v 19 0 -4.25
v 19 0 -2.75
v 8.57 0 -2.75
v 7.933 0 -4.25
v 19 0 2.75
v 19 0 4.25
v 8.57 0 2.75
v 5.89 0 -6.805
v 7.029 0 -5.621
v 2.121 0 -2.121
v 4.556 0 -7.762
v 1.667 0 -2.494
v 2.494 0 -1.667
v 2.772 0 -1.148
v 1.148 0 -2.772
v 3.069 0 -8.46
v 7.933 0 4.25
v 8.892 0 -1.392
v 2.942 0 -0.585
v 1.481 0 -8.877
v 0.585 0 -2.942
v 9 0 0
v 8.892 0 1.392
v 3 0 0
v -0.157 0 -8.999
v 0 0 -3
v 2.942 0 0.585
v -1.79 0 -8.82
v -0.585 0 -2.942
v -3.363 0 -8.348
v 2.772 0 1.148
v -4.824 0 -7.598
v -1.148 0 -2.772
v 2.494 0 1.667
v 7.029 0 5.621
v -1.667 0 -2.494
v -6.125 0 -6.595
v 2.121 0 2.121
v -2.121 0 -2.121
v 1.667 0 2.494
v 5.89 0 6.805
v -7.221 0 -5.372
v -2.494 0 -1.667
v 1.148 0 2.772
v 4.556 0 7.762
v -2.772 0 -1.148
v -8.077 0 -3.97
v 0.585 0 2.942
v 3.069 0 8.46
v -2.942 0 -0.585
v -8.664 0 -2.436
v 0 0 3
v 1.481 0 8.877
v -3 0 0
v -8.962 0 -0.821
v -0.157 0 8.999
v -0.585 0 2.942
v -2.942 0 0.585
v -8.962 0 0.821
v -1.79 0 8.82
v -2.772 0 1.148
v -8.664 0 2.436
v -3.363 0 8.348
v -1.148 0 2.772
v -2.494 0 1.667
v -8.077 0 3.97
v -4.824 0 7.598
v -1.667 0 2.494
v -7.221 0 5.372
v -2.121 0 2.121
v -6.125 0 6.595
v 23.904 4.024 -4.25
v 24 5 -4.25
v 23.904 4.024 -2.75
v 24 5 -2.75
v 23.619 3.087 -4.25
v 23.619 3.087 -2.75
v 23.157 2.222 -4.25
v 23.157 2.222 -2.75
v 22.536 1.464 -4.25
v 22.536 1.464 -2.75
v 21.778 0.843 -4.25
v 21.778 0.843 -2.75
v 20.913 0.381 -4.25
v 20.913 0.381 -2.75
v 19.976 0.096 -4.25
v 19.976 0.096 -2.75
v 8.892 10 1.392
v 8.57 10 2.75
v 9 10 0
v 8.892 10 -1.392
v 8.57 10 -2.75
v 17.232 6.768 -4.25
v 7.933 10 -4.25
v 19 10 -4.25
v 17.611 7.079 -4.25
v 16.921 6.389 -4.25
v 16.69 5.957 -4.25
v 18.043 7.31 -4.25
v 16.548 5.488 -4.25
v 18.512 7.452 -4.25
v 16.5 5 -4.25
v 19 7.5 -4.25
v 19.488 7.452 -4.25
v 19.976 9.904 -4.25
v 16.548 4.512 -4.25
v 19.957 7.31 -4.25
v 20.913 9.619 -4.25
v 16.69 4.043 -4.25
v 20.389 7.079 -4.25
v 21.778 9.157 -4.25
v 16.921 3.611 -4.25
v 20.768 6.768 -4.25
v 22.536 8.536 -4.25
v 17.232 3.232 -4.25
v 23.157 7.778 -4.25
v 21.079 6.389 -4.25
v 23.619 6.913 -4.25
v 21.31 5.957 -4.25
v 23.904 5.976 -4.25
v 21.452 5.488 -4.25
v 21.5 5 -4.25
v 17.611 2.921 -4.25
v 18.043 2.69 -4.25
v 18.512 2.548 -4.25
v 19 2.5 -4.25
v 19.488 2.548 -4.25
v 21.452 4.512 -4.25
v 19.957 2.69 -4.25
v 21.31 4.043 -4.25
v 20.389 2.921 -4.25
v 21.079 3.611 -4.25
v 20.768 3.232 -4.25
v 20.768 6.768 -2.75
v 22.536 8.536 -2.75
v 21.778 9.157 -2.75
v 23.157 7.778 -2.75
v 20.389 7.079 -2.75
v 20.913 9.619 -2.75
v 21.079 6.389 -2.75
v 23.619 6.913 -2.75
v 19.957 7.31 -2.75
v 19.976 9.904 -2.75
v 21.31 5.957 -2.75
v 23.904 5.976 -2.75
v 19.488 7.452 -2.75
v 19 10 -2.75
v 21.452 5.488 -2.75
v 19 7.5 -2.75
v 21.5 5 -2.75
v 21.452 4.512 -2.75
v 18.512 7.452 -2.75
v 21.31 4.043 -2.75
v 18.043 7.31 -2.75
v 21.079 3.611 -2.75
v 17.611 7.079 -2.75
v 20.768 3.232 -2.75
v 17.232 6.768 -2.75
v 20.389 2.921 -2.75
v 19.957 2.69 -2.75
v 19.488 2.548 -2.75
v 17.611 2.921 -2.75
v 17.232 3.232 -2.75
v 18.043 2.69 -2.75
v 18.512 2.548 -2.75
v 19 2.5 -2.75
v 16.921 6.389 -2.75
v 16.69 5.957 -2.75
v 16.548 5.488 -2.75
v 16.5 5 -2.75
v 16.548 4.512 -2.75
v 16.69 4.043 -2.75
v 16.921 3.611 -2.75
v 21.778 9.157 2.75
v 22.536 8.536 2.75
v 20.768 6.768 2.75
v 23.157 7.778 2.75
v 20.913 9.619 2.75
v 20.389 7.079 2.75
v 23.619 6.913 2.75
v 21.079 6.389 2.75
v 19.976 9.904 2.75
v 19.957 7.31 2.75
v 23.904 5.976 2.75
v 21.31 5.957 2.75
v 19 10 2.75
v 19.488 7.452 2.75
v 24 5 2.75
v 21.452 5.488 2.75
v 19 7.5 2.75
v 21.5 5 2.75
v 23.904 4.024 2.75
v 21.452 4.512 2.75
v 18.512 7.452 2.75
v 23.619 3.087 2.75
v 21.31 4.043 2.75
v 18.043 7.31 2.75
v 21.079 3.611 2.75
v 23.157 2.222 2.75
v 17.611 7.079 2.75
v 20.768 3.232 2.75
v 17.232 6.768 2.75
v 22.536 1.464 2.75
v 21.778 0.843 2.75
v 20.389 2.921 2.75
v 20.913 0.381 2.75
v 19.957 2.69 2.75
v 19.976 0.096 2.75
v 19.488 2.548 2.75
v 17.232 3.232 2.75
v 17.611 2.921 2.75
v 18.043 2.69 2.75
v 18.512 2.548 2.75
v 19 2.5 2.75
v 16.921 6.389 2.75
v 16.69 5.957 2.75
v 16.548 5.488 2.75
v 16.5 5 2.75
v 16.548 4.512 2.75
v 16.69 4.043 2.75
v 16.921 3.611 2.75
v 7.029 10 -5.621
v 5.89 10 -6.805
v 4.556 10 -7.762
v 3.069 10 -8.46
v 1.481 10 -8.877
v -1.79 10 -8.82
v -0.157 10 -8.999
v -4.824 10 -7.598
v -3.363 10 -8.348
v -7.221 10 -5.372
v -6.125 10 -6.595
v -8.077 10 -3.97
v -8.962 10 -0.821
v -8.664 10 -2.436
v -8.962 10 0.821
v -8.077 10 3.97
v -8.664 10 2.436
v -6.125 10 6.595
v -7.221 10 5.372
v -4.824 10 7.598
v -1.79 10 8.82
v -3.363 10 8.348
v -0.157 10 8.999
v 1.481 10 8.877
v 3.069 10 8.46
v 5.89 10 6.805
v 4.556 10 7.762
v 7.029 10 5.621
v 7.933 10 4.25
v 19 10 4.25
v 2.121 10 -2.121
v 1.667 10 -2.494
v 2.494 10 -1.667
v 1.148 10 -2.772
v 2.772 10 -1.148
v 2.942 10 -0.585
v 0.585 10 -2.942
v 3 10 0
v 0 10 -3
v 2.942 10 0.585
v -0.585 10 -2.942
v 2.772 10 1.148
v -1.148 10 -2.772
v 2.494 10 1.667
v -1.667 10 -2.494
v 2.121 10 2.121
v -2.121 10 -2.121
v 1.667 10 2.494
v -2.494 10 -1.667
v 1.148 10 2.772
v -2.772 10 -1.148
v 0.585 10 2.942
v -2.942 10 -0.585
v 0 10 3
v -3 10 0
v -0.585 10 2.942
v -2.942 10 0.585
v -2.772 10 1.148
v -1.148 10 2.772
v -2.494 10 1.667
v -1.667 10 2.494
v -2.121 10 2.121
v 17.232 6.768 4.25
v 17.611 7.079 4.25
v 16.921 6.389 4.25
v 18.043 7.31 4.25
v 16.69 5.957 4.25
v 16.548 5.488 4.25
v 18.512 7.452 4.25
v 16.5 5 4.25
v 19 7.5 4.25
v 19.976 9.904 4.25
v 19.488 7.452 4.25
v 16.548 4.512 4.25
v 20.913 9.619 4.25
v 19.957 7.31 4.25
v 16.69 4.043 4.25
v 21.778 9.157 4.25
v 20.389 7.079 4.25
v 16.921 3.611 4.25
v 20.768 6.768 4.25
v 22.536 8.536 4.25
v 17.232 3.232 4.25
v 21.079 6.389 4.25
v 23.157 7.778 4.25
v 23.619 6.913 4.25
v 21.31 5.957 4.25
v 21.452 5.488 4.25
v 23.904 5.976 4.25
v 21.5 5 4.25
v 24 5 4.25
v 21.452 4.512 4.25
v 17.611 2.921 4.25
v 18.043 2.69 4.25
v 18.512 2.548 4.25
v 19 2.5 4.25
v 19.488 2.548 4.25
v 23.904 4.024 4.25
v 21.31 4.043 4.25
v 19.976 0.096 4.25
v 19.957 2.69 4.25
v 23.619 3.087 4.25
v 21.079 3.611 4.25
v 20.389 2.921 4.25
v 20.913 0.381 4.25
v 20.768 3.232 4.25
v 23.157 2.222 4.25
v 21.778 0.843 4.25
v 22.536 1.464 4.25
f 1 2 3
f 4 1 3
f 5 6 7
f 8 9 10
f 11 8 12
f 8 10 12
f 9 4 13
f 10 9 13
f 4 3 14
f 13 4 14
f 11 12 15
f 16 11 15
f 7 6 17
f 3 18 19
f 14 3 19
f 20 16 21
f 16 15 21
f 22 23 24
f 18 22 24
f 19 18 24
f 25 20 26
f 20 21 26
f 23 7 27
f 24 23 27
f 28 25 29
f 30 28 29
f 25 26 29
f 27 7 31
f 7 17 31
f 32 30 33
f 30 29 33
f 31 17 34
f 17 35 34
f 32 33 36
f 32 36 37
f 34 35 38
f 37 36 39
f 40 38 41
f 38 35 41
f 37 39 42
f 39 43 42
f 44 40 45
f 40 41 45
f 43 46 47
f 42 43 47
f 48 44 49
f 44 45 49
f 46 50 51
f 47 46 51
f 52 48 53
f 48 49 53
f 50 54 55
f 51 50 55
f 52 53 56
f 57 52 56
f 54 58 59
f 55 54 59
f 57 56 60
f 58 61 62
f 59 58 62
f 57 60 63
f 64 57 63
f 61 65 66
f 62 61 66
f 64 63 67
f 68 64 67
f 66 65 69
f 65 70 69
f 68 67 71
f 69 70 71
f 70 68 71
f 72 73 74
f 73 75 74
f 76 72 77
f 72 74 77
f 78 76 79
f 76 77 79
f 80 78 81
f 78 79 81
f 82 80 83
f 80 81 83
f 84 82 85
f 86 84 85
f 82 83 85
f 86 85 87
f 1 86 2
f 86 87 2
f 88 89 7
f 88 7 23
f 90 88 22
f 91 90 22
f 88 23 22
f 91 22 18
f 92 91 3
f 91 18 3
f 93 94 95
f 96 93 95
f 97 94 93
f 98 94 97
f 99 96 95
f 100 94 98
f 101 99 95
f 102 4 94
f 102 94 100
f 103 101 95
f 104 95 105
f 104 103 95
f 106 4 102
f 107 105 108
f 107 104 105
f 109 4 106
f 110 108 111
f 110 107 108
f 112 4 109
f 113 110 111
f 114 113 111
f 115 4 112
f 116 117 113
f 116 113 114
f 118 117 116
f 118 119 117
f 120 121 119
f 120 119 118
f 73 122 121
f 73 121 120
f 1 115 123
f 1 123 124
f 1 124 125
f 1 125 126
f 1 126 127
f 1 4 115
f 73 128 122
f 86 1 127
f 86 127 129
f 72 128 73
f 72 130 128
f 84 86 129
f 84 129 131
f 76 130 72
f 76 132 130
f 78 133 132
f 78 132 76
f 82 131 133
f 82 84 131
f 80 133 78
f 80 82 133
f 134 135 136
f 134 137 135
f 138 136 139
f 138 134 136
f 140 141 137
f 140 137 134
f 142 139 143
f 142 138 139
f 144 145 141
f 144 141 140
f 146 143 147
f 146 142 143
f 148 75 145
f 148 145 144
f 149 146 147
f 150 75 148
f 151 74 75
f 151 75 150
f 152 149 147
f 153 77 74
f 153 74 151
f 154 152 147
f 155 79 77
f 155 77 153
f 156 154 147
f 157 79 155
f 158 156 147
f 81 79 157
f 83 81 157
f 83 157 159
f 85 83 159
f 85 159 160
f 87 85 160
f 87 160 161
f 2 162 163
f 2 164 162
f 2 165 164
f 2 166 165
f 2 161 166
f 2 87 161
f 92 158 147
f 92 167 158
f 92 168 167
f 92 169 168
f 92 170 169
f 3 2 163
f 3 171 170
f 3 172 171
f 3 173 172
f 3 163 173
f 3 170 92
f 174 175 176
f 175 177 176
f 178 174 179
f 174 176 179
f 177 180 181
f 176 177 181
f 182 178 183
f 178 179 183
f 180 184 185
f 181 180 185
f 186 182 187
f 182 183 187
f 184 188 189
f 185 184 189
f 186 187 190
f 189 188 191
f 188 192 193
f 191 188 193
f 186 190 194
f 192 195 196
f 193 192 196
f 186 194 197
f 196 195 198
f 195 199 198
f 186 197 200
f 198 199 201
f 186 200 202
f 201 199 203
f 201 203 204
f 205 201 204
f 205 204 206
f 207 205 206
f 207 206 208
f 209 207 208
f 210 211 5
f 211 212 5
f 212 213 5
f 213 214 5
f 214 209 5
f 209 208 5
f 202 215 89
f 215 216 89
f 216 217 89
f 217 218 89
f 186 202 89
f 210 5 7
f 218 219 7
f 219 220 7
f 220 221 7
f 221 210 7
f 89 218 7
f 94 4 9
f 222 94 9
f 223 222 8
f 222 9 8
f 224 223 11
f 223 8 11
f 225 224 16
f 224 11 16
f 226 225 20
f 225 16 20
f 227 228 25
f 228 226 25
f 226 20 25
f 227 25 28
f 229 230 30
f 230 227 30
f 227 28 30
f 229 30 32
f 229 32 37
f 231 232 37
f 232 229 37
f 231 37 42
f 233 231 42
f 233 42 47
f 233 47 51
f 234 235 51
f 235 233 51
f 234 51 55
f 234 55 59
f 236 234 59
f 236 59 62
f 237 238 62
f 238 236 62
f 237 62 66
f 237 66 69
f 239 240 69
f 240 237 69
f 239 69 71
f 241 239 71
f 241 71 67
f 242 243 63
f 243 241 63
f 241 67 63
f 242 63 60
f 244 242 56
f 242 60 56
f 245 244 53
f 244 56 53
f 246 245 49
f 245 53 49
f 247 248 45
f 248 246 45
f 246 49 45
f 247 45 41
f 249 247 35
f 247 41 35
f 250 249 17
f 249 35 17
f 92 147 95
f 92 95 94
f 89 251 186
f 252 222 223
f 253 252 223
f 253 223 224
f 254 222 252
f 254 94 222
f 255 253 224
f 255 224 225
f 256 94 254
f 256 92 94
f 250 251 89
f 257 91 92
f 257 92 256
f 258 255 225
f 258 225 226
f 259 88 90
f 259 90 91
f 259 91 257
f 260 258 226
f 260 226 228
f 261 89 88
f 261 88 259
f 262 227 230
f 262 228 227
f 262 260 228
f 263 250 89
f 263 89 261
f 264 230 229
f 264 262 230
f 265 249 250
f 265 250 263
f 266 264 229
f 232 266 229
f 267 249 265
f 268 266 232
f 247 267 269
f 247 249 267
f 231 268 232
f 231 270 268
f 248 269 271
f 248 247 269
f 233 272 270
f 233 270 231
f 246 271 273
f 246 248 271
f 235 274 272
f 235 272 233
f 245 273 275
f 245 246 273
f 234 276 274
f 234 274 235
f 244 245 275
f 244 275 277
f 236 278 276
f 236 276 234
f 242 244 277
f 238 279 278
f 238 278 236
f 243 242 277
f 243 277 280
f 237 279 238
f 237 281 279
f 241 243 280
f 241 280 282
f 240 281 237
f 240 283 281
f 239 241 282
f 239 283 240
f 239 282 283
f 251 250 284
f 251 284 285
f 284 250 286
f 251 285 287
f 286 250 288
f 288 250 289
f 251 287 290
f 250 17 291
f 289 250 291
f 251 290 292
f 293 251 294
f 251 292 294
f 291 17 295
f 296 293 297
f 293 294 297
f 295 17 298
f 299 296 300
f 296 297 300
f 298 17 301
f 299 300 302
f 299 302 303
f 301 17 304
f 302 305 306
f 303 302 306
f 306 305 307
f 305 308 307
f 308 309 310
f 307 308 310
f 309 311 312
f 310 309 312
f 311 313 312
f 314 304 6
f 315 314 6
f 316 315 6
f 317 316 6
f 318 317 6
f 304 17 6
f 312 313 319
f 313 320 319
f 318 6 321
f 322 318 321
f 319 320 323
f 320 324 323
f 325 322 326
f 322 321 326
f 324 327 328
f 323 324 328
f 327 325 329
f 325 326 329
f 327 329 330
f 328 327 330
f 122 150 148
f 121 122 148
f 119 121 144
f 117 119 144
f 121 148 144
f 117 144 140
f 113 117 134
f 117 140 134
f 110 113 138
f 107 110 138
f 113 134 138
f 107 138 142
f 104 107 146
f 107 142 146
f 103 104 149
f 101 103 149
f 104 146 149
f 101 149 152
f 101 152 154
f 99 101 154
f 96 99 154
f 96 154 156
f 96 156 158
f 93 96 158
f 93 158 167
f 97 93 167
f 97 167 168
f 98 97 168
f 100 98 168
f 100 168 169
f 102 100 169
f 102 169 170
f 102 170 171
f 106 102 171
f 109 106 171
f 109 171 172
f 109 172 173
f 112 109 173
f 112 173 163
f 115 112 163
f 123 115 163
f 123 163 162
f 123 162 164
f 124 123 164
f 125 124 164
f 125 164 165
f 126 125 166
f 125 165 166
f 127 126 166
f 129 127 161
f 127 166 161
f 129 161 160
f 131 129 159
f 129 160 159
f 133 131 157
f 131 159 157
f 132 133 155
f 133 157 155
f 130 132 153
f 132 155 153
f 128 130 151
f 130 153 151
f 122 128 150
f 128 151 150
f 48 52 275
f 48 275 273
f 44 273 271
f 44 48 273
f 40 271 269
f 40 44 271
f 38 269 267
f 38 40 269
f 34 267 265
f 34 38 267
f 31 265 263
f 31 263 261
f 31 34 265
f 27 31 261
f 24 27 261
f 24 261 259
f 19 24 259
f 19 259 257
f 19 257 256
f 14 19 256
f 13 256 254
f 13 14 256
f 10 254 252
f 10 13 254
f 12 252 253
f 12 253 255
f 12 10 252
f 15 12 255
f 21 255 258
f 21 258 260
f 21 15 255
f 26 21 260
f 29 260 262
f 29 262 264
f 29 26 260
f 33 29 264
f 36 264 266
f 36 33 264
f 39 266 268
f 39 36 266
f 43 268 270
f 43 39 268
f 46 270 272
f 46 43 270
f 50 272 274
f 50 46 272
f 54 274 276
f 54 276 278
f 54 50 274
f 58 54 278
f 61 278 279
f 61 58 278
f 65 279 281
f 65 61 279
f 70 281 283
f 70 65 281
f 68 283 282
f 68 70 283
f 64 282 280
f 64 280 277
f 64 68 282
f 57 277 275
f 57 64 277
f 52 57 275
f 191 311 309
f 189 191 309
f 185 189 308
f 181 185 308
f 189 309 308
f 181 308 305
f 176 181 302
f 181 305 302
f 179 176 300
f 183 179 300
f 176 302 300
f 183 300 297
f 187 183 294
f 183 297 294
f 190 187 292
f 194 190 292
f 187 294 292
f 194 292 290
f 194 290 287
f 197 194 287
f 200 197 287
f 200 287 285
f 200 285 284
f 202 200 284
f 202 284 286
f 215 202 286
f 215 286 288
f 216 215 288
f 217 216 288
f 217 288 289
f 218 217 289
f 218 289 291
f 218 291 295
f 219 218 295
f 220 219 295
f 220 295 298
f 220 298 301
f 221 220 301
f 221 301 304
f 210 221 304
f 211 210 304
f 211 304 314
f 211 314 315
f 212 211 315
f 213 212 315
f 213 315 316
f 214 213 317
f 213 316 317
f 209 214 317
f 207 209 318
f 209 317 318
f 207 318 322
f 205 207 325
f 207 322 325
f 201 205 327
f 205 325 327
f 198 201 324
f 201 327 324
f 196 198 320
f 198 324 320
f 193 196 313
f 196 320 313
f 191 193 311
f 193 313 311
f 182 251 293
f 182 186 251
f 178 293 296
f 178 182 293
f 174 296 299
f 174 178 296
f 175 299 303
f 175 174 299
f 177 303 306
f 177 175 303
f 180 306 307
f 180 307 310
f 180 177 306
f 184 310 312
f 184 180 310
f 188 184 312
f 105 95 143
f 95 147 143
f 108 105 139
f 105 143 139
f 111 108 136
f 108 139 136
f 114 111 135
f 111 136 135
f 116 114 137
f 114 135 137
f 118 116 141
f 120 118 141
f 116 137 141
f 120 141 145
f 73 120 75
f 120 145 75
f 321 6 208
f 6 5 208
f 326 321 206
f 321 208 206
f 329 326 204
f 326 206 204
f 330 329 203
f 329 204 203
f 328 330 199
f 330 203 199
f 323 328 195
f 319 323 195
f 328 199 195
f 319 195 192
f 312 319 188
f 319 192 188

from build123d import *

# Parameters (mm, degrees)
SKETCH1_R           = 9
SKETCH1_R_2         = 3
BOSS_EXTRUDE1_DEPTH = 10
BOSS_EXTRUDE3_DEPTH = 10
FILLET1_R           = 5
SKETCH6_R           = 2.5
CUT_EXTRUDE2_DEPTH  = 25


with BuildPart() as part:
    # Sketch1 → Boss-Extrude1 (new body)
    with BuildSketch(Plane(origin=(0, 0, 0), x_dir=(1, 0, 0), z_dir=(0, 1, 0))):
        with Locations(Location((0, 0, 0), (0, 0, 270))):
            Circle(SKETCH1_R)
        with Locations(Location((0, 0, 0), (0, 0, 270))):
            Circle(SKETCH1_R_2, mode=Mode.SUBTRACT)
    extrude(amount=BOSS_EXTRUDE1_DEPTH)

    # Sketch5 → Boss-Extrude3 (add)
    with BuildSketch(Plane.XZ):
        Polygon((7.933315826, 4.25), (24, 4.25), (24, 2.75), (7.137975048, 2.75), align=None)
        Polygon((7.137975048, -2.75), (7.933315826, -4.25), (24, -4.25), (24, -2.75), align=None)
    extrude(amount=-BOSS_EXTRUDE3_DEPTH)

    # Fillet1
    fillet1_edges = [part.edges().sort_by_distance(p)[0] for p in [
        (24, 0, -3.5),
        (24, 10, -3.5),
        (24, 10, 3.5),
        (24, 0, 3.5),
    ]]
    fillet(fillet1_edges, radius=FILLET1_R - 0.0001)  # a hair under: the kernel refuses the full size

    # Sketch6 → Cut-Extrude2 (cut)
    with BuildSketch(Plane.XY.offset(4.25)):
        with Locations((19, 5)):
            Circle(SKETCH6_R)
    extrude(amount=-CUT_EXTRUDE2_DEPTH, mode=Mode.SUBTRACT)


solid = part.part
